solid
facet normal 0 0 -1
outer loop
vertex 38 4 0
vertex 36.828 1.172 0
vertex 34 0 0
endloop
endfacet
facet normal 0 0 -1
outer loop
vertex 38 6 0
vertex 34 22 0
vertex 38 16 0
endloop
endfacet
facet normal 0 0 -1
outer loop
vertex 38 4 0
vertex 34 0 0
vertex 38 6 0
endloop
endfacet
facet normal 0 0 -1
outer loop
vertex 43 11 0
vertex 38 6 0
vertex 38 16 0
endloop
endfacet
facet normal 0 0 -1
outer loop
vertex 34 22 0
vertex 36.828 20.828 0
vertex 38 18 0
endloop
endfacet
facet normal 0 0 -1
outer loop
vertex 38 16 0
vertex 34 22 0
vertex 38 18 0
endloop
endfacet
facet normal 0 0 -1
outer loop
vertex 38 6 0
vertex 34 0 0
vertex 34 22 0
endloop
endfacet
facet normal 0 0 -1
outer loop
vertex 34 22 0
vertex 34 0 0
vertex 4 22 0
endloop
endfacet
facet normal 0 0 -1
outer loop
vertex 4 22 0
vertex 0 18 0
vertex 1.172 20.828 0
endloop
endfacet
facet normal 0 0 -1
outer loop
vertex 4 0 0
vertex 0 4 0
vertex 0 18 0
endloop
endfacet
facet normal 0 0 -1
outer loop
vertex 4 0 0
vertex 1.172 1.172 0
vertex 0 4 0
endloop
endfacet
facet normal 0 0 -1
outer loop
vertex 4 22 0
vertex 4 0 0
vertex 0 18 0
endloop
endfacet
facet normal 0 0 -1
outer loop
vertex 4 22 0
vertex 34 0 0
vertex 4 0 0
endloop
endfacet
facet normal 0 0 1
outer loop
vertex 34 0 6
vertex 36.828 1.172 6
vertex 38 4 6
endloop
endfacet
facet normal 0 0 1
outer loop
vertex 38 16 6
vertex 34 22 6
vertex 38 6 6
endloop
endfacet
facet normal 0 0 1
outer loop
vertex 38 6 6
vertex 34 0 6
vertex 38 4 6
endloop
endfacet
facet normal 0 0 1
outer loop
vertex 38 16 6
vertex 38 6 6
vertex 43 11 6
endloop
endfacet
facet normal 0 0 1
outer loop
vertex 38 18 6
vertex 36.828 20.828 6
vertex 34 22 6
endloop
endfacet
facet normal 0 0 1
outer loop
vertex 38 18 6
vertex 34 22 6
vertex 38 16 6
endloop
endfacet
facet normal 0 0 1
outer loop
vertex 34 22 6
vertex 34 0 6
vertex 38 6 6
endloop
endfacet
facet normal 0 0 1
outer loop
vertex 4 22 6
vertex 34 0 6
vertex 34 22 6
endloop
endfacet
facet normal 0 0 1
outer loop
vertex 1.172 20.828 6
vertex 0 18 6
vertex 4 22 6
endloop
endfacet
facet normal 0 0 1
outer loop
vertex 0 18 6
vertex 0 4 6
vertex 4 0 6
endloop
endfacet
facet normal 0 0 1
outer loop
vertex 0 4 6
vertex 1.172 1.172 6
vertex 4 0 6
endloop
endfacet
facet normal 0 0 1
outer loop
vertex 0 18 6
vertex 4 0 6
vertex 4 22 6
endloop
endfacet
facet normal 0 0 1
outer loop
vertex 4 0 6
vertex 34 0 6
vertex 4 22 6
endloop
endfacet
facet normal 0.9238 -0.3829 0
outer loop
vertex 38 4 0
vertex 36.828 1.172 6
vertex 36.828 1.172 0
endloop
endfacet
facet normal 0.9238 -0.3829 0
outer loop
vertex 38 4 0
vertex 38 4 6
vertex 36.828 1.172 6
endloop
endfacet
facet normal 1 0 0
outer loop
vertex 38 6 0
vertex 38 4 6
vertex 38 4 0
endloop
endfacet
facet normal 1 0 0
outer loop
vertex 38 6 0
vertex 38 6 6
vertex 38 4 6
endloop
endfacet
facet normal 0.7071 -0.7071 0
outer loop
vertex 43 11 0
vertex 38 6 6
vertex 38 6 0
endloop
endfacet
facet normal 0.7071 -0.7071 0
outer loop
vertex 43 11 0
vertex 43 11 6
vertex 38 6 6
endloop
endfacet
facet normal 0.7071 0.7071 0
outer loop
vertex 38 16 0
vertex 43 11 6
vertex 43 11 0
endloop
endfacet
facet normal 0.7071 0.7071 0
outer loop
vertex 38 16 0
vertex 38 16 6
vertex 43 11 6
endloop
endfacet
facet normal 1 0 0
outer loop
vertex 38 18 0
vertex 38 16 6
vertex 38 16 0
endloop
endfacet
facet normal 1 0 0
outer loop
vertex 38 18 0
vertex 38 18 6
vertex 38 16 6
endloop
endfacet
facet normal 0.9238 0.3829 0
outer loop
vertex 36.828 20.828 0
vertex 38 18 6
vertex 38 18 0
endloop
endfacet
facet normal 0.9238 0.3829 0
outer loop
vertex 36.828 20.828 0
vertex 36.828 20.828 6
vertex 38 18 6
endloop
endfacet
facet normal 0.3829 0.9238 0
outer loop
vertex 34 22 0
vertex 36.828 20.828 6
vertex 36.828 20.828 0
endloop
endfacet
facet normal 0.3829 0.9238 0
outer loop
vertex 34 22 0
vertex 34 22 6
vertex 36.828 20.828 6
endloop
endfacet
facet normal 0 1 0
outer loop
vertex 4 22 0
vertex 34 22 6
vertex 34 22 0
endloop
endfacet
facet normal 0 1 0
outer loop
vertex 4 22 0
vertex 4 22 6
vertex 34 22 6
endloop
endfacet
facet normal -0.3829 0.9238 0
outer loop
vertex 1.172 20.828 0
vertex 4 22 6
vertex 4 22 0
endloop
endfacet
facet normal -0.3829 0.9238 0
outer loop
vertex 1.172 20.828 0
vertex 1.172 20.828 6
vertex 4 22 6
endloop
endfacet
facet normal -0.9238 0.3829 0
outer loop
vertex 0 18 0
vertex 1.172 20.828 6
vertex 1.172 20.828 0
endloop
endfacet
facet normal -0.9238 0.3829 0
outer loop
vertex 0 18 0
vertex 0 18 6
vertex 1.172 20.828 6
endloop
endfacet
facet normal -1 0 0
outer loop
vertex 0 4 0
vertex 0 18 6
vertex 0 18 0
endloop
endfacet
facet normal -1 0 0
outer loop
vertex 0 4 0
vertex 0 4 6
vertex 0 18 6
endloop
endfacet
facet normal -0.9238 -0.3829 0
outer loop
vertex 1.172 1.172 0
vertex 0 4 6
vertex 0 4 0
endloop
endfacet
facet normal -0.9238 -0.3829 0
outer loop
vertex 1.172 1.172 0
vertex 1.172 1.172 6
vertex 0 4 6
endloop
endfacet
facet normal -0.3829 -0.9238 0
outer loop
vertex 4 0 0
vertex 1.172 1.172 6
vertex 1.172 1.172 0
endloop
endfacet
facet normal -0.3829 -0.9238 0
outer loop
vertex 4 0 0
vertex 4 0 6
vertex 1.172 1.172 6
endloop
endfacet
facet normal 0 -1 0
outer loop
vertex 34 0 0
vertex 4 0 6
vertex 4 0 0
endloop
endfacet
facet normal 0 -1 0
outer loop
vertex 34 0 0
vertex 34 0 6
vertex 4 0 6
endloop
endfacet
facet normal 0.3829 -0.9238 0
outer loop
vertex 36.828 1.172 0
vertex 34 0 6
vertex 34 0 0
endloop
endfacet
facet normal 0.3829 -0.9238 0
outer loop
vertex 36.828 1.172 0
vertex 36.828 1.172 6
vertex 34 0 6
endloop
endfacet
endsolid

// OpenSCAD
$fn = 32;

// ----------------------------------------------------------------------
// Ratchet pawl: 38 x 22 mm body, beak 5 mm с правого торца
// ----------------------------------------------------------------------

// --- parameters (mm) ---
profile_height = 6;       // extrusion height
profile_points = 15;      // points of the closed outline

profile = [[0, 4], [1.172, 1.172], [4, 0], [34, 0], [36.828, 1.172], [38, 4], [38, 6], [43, 11], [38, 16], [38, 18], [36.828, 20.828], [34, 22], [4, 22], [1.172, 20.828], [0, 18]];  // single closed polygon, 15 points, counter clockwise

// --- the one profile operation ---
linear_extrude(height = profile_height) polygon(points = profile);
